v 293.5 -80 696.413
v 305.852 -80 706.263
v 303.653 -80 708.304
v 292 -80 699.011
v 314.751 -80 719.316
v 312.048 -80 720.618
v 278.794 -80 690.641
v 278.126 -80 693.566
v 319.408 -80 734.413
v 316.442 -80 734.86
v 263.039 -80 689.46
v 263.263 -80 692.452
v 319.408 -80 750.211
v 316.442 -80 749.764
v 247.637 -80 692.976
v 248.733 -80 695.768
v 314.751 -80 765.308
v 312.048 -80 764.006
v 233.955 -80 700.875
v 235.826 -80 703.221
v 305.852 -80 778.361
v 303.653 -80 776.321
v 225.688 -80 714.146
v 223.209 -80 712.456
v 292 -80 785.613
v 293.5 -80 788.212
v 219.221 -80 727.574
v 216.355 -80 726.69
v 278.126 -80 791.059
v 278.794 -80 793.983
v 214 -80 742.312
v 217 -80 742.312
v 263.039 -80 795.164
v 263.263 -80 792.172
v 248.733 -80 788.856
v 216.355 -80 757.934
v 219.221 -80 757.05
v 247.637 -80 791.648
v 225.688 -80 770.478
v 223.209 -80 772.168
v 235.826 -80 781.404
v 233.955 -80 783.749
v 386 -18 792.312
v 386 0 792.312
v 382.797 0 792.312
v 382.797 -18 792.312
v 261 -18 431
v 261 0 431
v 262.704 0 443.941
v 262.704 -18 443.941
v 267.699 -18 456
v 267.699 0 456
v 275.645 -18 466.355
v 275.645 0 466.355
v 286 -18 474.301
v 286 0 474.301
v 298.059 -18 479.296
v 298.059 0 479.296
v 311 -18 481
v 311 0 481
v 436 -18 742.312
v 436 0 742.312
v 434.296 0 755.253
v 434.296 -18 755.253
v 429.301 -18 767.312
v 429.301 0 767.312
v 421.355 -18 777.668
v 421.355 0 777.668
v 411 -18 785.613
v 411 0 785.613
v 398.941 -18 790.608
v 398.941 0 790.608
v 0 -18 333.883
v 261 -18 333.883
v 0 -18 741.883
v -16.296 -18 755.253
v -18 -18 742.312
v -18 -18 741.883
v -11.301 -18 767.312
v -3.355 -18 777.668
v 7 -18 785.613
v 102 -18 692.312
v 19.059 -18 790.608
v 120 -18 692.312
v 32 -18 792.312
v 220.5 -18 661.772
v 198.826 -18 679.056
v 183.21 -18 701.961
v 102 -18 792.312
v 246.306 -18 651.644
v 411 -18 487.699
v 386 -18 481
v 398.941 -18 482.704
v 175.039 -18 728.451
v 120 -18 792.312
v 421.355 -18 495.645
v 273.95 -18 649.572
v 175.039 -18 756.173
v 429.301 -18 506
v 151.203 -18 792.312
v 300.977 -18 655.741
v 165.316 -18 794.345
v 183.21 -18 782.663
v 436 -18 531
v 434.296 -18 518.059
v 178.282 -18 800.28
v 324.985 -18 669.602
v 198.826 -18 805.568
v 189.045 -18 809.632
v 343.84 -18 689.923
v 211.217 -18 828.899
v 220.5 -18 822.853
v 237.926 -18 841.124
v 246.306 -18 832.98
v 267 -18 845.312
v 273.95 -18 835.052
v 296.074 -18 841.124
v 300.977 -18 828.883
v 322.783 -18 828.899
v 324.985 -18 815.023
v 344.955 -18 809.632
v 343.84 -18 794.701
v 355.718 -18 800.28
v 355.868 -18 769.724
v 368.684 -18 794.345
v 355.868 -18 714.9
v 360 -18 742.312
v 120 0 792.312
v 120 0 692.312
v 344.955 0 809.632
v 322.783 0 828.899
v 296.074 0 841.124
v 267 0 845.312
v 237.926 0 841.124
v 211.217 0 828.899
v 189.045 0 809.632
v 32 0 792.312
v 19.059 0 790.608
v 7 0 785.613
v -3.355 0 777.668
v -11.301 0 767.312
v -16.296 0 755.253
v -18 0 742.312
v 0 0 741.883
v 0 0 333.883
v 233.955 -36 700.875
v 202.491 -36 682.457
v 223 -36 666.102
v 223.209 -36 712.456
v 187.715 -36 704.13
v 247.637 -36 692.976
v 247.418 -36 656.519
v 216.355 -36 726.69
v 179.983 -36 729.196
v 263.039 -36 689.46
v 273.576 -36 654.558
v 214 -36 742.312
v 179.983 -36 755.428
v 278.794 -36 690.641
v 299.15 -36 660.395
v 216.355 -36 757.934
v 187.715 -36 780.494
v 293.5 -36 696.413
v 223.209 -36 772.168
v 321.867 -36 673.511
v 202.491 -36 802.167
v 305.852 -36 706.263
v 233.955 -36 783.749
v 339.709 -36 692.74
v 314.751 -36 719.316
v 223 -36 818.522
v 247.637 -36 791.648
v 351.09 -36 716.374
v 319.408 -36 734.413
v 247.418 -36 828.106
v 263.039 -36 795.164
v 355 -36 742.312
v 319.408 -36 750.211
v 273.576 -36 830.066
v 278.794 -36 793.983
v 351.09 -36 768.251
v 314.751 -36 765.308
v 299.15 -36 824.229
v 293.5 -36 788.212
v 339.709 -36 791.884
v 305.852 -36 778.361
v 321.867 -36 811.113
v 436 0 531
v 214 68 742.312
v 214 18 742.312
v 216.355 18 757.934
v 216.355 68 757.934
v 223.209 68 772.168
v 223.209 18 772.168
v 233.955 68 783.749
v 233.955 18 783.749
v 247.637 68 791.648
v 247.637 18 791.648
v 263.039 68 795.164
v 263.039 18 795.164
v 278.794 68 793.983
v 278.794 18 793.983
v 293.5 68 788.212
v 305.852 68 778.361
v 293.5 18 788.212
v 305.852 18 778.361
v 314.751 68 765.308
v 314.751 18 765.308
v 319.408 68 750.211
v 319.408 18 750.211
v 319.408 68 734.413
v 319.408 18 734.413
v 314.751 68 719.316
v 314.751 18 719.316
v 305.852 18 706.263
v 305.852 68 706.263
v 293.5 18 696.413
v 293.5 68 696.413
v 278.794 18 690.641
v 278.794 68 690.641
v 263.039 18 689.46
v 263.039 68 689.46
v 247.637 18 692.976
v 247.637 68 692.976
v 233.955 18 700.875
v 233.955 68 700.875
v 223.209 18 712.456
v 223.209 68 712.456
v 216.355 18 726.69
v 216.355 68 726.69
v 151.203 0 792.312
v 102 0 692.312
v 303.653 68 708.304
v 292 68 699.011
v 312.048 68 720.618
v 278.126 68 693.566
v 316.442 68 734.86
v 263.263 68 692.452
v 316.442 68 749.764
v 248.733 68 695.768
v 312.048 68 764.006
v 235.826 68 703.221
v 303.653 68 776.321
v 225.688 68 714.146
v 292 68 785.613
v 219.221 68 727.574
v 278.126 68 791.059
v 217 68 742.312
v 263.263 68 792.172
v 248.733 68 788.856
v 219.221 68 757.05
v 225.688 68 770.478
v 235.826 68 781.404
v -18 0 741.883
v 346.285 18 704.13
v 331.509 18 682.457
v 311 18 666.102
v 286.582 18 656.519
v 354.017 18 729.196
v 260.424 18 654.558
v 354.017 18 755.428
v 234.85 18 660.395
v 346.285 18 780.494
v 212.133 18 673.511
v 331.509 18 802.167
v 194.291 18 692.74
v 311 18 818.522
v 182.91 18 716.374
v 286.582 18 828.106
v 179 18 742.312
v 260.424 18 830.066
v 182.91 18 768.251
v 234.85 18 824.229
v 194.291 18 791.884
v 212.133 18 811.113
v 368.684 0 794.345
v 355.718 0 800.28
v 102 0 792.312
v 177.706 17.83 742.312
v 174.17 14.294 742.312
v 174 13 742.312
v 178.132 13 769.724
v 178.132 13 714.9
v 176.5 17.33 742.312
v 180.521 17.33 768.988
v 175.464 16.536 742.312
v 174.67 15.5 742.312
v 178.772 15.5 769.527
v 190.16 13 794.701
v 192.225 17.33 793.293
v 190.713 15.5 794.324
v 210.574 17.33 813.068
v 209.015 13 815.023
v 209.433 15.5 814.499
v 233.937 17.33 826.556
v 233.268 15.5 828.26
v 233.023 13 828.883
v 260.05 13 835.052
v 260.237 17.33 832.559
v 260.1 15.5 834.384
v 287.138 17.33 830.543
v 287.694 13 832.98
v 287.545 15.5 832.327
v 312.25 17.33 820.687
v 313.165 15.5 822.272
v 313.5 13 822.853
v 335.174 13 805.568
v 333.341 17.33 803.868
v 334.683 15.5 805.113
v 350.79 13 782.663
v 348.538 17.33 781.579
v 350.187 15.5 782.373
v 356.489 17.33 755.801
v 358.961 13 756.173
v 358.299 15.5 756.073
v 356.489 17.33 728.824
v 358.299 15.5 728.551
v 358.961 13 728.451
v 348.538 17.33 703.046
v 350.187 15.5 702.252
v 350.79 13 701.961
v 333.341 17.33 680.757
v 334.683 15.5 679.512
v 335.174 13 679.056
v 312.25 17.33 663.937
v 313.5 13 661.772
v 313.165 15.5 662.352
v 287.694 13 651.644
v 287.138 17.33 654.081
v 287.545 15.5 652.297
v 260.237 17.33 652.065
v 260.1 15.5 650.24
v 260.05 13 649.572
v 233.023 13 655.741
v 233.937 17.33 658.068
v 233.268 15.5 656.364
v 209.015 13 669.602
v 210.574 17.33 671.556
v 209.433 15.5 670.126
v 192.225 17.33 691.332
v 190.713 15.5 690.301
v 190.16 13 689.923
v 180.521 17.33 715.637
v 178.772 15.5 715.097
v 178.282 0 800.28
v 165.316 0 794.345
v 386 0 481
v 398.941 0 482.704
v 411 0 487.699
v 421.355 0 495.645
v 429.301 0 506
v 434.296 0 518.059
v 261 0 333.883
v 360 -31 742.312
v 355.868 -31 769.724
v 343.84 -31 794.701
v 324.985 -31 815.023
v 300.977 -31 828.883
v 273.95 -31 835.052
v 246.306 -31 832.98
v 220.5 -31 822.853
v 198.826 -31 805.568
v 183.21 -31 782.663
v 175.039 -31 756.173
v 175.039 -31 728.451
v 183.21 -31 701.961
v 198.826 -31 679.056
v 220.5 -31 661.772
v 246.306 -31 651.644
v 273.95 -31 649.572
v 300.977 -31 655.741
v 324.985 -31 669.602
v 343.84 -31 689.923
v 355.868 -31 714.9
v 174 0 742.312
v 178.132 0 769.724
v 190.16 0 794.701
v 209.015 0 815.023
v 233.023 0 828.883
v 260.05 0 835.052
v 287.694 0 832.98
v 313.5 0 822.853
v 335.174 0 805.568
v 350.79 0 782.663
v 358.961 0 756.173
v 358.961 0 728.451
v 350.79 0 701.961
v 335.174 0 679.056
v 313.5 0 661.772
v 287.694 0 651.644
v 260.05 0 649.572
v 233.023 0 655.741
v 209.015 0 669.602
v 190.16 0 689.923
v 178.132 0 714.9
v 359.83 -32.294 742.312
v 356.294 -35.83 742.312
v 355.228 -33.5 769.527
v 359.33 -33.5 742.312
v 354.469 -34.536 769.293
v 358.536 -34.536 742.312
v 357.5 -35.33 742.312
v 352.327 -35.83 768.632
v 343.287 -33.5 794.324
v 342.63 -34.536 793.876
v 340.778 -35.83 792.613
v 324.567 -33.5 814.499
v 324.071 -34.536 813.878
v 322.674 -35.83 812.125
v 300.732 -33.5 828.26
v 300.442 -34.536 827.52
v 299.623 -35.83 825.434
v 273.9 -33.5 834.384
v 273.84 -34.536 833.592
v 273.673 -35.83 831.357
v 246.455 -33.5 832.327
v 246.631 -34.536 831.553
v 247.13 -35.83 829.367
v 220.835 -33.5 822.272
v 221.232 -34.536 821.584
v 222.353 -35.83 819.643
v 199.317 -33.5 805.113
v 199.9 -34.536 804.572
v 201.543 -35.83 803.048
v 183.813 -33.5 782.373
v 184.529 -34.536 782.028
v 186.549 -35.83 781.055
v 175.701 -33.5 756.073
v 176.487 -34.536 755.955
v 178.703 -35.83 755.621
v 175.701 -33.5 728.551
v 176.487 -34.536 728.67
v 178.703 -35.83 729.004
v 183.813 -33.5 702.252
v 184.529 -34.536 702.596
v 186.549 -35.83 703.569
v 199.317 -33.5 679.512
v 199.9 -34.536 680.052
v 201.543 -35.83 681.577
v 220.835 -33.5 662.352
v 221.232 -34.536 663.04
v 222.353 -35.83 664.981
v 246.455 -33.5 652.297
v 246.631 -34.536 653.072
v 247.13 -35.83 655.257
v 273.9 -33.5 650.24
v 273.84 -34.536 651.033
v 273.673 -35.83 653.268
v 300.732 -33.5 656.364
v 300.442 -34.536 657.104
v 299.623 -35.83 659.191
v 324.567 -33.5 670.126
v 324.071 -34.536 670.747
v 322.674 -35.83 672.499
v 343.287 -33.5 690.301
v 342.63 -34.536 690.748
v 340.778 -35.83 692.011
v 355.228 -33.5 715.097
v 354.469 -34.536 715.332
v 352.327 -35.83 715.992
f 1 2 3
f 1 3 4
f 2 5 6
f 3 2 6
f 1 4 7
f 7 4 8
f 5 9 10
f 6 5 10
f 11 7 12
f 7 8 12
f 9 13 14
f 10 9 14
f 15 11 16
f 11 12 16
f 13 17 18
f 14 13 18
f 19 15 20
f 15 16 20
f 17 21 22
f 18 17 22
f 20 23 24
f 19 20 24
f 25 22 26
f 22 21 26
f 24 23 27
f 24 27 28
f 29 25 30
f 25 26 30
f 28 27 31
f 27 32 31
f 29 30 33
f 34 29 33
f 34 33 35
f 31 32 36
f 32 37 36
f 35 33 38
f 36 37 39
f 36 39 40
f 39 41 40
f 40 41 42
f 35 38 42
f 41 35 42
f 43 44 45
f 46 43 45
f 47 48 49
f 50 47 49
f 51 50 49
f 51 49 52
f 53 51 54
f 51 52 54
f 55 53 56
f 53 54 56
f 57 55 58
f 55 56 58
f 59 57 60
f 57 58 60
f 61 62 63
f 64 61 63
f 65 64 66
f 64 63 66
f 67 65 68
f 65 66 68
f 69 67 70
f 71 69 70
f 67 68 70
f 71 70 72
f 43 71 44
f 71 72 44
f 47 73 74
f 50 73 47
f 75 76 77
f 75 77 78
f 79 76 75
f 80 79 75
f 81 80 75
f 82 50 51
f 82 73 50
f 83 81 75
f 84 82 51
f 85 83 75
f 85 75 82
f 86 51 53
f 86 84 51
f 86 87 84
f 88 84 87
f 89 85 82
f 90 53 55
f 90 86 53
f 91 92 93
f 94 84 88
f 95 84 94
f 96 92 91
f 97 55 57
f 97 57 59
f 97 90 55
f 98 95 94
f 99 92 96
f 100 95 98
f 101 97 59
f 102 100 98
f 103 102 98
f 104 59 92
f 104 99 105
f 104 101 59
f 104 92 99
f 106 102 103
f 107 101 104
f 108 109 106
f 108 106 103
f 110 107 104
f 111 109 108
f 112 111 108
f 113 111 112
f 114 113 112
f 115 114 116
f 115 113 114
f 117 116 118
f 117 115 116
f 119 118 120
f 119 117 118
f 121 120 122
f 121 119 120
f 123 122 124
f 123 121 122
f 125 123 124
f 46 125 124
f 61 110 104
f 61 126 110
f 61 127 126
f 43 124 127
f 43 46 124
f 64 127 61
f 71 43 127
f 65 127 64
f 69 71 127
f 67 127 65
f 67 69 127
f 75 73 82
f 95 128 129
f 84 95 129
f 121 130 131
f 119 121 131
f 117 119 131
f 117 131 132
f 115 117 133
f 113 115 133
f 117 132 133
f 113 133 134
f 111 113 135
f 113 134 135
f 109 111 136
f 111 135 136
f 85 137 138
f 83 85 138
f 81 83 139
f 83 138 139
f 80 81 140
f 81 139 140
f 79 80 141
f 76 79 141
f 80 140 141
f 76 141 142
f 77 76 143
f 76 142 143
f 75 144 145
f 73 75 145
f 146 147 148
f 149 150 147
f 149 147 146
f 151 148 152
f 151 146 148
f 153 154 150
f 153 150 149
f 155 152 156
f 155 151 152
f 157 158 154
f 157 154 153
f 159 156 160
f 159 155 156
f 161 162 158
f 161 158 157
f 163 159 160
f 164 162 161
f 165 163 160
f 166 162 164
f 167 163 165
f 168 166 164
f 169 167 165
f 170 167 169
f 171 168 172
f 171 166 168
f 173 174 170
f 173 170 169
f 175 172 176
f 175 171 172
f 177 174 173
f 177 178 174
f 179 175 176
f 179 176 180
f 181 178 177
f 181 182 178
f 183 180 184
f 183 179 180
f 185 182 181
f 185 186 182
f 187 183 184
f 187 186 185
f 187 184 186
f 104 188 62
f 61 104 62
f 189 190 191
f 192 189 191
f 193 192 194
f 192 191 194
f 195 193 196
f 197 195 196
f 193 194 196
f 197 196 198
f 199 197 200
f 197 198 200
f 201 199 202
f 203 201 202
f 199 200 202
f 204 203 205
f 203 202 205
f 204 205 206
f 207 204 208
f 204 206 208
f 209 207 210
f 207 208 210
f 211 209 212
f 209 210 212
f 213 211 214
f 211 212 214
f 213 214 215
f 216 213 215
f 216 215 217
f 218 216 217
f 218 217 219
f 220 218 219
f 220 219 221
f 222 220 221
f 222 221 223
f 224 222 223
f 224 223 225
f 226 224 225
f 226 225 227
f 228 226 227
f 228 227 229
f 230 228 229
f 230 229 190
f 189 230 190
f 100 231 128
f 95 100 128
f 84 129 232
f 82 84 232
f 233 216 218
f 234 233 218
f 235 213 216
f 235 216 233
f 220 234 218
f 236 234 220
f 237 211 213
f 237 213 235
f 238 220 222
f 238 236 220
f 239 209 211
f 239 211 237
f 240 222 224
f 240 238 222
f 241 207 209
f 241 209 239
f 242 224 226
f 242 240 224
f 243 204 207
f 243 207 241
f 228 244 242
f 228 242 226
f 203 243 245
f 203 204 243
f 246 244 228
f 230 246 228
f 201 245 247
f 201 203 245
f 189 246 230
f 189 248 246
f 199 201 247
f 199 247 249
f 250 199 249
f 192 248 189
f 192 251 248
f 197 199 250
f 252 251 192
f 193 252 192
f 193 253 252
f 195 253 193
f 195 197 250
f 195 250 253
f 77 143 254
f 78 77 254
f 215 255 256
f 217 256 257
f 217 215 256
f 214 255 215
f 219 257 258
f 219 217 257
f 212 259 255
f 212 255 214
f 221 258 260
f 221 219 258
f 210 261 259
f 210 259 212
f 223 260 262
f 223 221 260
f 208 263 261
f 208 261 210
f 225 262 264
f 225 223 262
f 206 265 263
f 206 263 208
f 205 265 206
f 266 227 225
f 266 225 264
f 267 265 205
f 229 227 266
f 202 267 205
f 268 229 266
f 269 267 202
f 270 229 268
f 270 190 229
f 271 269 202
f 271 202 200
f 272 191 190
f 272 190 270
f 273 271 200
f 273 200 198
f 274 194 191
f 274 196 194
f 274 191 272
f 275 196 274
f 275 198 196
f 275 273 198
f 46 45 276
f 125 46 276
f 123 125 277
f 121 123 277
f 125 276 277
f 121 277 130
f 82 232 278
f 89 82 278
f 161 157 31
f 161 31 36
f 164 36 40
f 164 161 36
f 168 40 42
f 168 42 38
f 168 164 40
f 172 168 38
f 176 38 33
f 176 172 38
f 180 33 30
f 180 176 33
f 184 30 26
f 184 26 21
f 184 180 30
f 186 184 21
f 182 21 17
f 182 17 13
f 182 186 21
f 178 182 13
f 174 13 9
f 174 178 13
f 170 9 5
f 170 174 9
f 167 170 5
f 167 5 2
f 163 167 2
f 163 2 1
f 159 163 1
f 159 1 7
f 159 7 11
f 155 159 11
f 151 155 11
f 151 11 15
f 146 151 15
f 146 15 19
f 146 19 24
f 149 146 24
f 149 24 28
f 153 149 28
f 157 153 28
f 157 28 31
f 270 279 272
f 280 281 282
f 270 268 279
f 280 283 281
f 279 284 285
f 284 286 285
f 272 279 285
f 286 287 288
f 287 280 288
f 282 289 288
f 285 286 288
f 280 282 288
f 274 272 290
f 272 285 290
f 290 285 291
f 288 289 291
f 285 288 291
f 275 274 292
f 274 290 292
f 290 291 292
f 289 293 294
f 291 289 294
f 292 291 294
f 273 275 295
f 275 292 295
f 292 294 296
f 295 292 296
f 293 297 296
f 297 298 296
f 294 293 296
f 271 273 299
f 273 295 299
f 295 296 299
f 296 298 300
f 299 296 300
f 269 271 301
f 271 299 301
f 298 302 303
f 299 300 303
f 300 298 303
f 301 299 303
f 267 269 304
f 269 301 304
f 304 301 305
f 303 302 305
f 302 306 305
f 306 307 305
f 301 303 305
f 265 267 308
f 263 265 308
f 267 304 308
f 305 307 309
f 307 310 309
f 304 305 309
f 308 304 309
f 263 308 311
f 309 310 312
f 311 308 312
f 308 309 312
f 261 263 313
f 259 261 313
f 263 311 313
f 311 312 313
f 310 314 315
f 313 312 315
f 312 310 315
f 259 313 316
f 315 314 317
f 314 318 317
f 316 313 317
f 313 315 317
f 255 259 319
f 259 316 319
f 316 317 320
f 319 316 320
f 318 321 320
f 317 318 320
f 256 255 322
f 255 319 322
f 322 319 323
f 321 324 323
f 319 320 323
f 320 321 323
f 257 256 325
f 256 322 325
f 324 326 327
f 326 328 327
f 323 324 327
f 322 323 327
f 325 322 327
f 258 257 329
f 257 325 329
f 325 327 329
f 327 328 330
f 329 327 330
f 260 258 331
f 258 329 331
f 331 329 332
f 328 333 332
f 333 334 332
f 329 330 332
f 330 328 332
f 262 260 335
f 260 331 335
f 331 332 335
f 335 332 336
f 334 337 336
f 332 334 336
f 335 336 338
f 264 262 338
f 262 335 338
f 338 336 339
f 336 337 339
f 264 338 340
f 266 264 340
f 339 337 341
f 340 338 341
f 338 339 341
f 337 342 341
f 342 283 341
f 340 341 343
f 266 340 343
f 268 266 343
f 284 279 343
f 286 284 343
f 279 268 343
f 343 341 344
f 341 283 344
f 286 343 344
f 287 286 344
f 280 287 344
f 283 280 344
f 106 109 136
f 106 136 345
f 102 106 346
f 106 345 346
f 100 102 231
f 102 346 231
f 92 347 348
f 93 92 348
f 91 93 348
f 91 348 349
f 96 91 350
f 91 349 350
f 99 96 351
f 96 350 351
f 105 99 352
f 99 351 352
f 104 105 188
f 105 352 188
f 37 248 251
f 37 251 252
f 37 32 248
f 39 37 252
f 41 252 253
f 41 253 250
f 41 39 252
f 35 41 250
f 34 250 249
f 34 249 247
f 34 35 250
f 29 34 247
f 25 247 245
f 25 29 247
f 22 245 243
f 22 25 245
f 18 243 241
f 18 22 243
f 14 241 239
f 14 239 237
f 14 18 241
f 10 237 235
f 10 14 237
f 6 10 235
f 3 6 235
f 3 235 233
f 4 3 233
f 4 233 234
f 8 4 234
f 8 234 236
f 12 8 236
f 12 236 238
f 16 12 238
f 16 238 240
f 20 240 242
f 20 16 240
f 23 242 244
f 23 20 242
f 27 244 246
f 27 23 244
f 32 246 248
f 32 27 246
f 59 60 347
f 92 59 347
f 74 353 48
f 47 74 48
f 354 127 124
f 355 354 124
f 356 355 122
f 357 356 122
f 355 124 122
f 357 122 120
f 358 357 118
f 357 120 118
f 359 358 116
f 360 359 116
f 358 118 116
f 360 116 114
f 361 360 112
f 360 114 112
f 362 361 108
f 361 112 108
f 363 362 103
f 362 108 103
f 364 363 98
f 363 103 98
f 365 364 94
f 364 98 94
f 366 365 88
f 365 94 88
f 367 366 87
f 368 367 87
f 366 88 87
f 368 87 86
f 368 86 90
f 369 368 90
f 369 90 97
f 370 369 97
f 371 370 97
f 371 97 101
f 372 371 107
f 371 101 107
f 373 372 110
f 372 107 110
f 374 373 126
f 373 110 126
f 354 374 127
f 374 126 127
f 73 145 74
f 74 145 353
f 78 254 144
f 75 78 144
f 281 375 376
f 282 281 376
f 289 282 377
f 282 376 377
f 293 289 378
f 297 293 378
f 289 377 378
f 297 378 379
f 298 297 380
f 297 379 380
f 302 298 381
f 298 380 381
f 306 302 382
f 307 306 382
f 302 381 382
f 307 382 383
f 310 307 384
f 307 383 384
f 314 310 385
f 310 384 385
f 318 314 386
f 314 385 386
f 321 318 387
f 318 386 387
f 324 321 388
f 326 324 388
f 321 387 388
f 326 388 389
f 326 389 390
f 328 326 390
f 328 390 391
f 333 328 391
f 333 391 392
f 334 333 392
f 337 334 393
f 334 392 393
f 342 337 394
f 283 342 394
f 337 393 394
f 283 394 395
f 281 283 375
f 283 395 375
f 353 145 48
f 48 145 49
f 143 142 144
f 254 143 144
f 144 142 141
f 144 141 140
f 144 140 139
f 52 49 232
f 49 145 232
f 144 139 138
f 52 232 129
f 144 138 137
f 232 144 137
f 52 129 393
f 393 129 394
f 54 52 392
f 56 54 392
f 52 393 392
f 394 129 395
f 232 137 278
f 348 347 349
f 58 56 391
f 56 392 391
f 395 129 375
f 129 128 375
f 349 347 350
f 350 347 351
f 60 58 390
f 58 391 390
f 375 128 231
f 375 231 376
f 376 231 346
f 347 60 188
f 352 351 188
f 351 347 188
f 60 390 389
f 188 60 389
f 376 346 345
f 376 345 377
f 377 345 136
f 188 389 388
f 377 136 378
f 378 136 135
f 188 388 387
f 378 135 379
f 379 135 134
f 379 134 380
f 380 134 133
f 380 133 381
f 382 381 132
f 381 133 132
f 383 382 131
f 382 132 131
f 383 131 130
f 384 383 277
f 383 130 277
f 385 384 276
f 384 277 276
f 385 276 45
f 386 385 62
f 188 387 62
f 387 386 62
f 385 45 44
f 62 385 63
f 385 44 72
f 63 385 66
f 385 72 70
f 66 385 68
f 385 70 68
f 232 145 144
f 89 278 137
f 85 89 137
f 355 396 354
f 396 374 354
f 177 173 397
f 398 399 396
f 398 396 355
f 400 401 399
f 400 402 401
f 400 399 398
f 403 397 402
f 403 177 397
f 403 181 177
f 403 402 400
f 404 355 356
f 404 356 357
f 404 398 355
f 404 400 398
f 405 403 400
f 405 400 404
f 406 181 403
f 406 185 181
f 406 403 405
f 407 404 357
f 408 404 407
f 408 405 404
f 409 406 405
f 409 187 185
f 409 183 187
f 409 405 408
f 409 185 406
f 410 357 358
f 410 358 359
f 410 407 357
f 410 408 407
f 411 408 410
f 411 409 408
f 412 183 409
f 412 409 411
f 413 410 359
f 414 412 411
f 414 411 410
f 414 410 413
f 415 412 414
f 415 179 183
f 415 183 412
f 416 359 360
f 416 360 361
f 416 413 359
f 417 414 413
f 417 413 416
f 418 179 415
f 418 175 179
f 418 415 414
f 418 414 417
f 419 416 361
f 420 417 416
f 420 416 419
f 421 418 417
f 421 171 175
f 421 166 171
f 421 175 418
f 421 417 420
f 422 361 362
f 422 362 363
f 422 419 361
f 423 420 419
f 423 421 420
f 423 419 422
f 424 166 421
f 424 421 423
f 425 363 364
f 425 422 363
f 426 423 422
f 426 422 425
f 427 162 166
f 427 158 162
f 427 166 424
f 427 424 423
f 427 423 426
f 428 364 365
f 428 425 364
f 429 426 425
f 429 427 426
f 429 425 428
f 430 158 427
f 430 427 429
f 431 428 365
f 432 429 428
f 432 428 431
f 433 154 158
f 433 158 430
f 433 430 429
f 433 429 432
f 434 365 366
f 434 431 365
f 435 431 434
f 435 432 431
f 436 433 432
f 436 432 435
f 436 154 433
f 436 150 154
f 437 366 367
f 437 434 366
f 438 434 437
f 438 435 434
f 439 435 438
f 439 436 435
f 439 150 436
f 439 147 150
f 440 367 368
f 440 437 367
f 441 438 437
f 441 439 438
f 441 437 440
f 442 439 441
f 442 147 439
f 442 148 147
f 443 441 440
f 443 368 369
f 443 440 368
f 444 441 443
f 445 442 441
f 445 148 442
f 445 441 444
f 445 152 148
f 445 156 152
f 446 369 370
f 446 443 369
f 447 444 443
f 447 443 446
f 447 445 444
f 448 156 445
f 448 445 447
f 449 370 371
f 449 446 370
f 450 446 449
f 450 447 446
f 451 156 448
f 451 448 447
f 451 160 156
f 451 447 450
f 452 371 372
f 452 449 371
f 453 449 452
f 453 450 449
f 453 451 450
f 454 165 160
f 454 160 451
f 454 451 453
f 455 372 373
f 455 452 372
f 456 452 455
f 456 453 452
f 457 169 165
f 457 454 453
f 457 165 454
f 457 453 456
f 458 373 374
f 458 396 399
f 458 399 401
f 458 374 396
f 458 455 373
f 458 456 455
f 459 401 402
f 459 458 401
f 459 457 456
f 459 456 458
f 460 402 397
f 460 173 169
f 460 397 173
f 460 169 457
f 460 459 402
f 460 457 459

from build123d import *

# Parameters (mm, degrees)
F0_R          = 53
F1_DEPTH      = 18
F2_R          = 53
F2_R_2        = 50
F3_DEPTH      = 68
F3_DEPTH_BACK = 80
F4_R          = 93
F4_R_2        = 53
F5_DEPTH      = 18
F6_R          = 93
F6_R_2        = 53
F7_DEPTH      = 18
F8_R          = 5


with BuildPart() as f1:
    # F0 (on Front) → F1 (new body)
    with BuildSketch(Plane.XZ):
        with BuildLine():
            Line((0, 333.882748), (261, 333.882748))
            Line((261, 333.882748), (261, 431))
            ThreePointArc((261, 431), (275.644661, 466.355339), (311, 481))
            Line((311, 481), (386, 481))
            ThreePointArc((386, 481), (421.355339, 495.644661), (436, 531))
            Line((436, 531), (436, 742.312182))
            ThreePointArc((436, 742.312182), (421.355339, 777.667521), (386, 792.312182))
            Line((386, 792.312182), (382.797237, 792.312182))
            ThreePointArc((382.797237, 792.312182), (361.988427, 796.847982), (344.955002, 809.632443))
            ThreePointArc((344.955002, 809.632443), (267, 845.312182), (189.044998, 809.632443))
            ThreePointArc((189.044998, 809.632443), (172.011573, 796.847982), (151.202763, 792.312182))
            Line((151.202763, 792.312182), (120, 792.312182))
            Line((120, 792.312182), (120, 692.312182))
            Line((120, 692.312182), (102, 692.312182))
            Line((102, 692.312182), (102, 792.312182))
            Line((102, 792.312182), (32, 792.312182))
            ThreePointArc((32, 792.312182), (-3.355339, 777.667521), (-18, 742.312182))
            Line((-18, 742.312182), (-18, 741.883182))
            Line((-18, 741.883182), (0, 741.883182))
            Line((0, 741.883182), (0, 333.882748))
        make_face()
        with Locations((267, 742.312182)):
            Circle(F0_R, mode=Mode.SUBTRACT)
    extrude(amount=F1_DEPTH)

    # F2 (on face) → F3 (join, two sides)
    with BuildSketch(Plane(origin=(0, 0, 0), x_dir=(-1, 0, 0), z_dir=(0, 1, 0))) as f3_sk:
        with Locations((-267, 742.312182)):
            Circle(F2_R)
        with Locations((-267, 742.312182)):
            Circle(F2_R_2, mode=Mode.SUBTRACT)
    extrude(amount=F3_DEPTH)
    extrude(f3_sk.sketch, amount=-F3_DEPTH_BACK)

    # F4 (on face) → F5 (join)
    with BuildSketch(Plane(origin=(0, 0, 0), x_dir=(-1, 0, 0), z_dir=(0, 1, 0))):
        with Locations((-267, 742.312182)):
            Circle(F4_R)
        with Locations((-267, 742.312182)):
            Circle(F4_R_2, mode=Mode.SUBTRACT)
    extrude(amount=F5_DEPTH)

    # F6 (on face) → F7 (join)
    with BuildSketch(Plane.XZ.offset(18)):
        with Locations((267, 742.312182)):
            Circle(F6_R)
        with Locations((267, 742.312182)):
            Circle(F6_R_2, mode=Mode.SUBTRACT)
    extrude(amount=F7_DEPTH)

    # F8
    f8_edges = [f1.edges().sort_by_distance(p)[0] for p in [
        (360, 18, 742.312182),
        (174, -36, 742.312182),
    ]]
    fillet(f8_edges, radius=F8_R)


solid = f1.part
